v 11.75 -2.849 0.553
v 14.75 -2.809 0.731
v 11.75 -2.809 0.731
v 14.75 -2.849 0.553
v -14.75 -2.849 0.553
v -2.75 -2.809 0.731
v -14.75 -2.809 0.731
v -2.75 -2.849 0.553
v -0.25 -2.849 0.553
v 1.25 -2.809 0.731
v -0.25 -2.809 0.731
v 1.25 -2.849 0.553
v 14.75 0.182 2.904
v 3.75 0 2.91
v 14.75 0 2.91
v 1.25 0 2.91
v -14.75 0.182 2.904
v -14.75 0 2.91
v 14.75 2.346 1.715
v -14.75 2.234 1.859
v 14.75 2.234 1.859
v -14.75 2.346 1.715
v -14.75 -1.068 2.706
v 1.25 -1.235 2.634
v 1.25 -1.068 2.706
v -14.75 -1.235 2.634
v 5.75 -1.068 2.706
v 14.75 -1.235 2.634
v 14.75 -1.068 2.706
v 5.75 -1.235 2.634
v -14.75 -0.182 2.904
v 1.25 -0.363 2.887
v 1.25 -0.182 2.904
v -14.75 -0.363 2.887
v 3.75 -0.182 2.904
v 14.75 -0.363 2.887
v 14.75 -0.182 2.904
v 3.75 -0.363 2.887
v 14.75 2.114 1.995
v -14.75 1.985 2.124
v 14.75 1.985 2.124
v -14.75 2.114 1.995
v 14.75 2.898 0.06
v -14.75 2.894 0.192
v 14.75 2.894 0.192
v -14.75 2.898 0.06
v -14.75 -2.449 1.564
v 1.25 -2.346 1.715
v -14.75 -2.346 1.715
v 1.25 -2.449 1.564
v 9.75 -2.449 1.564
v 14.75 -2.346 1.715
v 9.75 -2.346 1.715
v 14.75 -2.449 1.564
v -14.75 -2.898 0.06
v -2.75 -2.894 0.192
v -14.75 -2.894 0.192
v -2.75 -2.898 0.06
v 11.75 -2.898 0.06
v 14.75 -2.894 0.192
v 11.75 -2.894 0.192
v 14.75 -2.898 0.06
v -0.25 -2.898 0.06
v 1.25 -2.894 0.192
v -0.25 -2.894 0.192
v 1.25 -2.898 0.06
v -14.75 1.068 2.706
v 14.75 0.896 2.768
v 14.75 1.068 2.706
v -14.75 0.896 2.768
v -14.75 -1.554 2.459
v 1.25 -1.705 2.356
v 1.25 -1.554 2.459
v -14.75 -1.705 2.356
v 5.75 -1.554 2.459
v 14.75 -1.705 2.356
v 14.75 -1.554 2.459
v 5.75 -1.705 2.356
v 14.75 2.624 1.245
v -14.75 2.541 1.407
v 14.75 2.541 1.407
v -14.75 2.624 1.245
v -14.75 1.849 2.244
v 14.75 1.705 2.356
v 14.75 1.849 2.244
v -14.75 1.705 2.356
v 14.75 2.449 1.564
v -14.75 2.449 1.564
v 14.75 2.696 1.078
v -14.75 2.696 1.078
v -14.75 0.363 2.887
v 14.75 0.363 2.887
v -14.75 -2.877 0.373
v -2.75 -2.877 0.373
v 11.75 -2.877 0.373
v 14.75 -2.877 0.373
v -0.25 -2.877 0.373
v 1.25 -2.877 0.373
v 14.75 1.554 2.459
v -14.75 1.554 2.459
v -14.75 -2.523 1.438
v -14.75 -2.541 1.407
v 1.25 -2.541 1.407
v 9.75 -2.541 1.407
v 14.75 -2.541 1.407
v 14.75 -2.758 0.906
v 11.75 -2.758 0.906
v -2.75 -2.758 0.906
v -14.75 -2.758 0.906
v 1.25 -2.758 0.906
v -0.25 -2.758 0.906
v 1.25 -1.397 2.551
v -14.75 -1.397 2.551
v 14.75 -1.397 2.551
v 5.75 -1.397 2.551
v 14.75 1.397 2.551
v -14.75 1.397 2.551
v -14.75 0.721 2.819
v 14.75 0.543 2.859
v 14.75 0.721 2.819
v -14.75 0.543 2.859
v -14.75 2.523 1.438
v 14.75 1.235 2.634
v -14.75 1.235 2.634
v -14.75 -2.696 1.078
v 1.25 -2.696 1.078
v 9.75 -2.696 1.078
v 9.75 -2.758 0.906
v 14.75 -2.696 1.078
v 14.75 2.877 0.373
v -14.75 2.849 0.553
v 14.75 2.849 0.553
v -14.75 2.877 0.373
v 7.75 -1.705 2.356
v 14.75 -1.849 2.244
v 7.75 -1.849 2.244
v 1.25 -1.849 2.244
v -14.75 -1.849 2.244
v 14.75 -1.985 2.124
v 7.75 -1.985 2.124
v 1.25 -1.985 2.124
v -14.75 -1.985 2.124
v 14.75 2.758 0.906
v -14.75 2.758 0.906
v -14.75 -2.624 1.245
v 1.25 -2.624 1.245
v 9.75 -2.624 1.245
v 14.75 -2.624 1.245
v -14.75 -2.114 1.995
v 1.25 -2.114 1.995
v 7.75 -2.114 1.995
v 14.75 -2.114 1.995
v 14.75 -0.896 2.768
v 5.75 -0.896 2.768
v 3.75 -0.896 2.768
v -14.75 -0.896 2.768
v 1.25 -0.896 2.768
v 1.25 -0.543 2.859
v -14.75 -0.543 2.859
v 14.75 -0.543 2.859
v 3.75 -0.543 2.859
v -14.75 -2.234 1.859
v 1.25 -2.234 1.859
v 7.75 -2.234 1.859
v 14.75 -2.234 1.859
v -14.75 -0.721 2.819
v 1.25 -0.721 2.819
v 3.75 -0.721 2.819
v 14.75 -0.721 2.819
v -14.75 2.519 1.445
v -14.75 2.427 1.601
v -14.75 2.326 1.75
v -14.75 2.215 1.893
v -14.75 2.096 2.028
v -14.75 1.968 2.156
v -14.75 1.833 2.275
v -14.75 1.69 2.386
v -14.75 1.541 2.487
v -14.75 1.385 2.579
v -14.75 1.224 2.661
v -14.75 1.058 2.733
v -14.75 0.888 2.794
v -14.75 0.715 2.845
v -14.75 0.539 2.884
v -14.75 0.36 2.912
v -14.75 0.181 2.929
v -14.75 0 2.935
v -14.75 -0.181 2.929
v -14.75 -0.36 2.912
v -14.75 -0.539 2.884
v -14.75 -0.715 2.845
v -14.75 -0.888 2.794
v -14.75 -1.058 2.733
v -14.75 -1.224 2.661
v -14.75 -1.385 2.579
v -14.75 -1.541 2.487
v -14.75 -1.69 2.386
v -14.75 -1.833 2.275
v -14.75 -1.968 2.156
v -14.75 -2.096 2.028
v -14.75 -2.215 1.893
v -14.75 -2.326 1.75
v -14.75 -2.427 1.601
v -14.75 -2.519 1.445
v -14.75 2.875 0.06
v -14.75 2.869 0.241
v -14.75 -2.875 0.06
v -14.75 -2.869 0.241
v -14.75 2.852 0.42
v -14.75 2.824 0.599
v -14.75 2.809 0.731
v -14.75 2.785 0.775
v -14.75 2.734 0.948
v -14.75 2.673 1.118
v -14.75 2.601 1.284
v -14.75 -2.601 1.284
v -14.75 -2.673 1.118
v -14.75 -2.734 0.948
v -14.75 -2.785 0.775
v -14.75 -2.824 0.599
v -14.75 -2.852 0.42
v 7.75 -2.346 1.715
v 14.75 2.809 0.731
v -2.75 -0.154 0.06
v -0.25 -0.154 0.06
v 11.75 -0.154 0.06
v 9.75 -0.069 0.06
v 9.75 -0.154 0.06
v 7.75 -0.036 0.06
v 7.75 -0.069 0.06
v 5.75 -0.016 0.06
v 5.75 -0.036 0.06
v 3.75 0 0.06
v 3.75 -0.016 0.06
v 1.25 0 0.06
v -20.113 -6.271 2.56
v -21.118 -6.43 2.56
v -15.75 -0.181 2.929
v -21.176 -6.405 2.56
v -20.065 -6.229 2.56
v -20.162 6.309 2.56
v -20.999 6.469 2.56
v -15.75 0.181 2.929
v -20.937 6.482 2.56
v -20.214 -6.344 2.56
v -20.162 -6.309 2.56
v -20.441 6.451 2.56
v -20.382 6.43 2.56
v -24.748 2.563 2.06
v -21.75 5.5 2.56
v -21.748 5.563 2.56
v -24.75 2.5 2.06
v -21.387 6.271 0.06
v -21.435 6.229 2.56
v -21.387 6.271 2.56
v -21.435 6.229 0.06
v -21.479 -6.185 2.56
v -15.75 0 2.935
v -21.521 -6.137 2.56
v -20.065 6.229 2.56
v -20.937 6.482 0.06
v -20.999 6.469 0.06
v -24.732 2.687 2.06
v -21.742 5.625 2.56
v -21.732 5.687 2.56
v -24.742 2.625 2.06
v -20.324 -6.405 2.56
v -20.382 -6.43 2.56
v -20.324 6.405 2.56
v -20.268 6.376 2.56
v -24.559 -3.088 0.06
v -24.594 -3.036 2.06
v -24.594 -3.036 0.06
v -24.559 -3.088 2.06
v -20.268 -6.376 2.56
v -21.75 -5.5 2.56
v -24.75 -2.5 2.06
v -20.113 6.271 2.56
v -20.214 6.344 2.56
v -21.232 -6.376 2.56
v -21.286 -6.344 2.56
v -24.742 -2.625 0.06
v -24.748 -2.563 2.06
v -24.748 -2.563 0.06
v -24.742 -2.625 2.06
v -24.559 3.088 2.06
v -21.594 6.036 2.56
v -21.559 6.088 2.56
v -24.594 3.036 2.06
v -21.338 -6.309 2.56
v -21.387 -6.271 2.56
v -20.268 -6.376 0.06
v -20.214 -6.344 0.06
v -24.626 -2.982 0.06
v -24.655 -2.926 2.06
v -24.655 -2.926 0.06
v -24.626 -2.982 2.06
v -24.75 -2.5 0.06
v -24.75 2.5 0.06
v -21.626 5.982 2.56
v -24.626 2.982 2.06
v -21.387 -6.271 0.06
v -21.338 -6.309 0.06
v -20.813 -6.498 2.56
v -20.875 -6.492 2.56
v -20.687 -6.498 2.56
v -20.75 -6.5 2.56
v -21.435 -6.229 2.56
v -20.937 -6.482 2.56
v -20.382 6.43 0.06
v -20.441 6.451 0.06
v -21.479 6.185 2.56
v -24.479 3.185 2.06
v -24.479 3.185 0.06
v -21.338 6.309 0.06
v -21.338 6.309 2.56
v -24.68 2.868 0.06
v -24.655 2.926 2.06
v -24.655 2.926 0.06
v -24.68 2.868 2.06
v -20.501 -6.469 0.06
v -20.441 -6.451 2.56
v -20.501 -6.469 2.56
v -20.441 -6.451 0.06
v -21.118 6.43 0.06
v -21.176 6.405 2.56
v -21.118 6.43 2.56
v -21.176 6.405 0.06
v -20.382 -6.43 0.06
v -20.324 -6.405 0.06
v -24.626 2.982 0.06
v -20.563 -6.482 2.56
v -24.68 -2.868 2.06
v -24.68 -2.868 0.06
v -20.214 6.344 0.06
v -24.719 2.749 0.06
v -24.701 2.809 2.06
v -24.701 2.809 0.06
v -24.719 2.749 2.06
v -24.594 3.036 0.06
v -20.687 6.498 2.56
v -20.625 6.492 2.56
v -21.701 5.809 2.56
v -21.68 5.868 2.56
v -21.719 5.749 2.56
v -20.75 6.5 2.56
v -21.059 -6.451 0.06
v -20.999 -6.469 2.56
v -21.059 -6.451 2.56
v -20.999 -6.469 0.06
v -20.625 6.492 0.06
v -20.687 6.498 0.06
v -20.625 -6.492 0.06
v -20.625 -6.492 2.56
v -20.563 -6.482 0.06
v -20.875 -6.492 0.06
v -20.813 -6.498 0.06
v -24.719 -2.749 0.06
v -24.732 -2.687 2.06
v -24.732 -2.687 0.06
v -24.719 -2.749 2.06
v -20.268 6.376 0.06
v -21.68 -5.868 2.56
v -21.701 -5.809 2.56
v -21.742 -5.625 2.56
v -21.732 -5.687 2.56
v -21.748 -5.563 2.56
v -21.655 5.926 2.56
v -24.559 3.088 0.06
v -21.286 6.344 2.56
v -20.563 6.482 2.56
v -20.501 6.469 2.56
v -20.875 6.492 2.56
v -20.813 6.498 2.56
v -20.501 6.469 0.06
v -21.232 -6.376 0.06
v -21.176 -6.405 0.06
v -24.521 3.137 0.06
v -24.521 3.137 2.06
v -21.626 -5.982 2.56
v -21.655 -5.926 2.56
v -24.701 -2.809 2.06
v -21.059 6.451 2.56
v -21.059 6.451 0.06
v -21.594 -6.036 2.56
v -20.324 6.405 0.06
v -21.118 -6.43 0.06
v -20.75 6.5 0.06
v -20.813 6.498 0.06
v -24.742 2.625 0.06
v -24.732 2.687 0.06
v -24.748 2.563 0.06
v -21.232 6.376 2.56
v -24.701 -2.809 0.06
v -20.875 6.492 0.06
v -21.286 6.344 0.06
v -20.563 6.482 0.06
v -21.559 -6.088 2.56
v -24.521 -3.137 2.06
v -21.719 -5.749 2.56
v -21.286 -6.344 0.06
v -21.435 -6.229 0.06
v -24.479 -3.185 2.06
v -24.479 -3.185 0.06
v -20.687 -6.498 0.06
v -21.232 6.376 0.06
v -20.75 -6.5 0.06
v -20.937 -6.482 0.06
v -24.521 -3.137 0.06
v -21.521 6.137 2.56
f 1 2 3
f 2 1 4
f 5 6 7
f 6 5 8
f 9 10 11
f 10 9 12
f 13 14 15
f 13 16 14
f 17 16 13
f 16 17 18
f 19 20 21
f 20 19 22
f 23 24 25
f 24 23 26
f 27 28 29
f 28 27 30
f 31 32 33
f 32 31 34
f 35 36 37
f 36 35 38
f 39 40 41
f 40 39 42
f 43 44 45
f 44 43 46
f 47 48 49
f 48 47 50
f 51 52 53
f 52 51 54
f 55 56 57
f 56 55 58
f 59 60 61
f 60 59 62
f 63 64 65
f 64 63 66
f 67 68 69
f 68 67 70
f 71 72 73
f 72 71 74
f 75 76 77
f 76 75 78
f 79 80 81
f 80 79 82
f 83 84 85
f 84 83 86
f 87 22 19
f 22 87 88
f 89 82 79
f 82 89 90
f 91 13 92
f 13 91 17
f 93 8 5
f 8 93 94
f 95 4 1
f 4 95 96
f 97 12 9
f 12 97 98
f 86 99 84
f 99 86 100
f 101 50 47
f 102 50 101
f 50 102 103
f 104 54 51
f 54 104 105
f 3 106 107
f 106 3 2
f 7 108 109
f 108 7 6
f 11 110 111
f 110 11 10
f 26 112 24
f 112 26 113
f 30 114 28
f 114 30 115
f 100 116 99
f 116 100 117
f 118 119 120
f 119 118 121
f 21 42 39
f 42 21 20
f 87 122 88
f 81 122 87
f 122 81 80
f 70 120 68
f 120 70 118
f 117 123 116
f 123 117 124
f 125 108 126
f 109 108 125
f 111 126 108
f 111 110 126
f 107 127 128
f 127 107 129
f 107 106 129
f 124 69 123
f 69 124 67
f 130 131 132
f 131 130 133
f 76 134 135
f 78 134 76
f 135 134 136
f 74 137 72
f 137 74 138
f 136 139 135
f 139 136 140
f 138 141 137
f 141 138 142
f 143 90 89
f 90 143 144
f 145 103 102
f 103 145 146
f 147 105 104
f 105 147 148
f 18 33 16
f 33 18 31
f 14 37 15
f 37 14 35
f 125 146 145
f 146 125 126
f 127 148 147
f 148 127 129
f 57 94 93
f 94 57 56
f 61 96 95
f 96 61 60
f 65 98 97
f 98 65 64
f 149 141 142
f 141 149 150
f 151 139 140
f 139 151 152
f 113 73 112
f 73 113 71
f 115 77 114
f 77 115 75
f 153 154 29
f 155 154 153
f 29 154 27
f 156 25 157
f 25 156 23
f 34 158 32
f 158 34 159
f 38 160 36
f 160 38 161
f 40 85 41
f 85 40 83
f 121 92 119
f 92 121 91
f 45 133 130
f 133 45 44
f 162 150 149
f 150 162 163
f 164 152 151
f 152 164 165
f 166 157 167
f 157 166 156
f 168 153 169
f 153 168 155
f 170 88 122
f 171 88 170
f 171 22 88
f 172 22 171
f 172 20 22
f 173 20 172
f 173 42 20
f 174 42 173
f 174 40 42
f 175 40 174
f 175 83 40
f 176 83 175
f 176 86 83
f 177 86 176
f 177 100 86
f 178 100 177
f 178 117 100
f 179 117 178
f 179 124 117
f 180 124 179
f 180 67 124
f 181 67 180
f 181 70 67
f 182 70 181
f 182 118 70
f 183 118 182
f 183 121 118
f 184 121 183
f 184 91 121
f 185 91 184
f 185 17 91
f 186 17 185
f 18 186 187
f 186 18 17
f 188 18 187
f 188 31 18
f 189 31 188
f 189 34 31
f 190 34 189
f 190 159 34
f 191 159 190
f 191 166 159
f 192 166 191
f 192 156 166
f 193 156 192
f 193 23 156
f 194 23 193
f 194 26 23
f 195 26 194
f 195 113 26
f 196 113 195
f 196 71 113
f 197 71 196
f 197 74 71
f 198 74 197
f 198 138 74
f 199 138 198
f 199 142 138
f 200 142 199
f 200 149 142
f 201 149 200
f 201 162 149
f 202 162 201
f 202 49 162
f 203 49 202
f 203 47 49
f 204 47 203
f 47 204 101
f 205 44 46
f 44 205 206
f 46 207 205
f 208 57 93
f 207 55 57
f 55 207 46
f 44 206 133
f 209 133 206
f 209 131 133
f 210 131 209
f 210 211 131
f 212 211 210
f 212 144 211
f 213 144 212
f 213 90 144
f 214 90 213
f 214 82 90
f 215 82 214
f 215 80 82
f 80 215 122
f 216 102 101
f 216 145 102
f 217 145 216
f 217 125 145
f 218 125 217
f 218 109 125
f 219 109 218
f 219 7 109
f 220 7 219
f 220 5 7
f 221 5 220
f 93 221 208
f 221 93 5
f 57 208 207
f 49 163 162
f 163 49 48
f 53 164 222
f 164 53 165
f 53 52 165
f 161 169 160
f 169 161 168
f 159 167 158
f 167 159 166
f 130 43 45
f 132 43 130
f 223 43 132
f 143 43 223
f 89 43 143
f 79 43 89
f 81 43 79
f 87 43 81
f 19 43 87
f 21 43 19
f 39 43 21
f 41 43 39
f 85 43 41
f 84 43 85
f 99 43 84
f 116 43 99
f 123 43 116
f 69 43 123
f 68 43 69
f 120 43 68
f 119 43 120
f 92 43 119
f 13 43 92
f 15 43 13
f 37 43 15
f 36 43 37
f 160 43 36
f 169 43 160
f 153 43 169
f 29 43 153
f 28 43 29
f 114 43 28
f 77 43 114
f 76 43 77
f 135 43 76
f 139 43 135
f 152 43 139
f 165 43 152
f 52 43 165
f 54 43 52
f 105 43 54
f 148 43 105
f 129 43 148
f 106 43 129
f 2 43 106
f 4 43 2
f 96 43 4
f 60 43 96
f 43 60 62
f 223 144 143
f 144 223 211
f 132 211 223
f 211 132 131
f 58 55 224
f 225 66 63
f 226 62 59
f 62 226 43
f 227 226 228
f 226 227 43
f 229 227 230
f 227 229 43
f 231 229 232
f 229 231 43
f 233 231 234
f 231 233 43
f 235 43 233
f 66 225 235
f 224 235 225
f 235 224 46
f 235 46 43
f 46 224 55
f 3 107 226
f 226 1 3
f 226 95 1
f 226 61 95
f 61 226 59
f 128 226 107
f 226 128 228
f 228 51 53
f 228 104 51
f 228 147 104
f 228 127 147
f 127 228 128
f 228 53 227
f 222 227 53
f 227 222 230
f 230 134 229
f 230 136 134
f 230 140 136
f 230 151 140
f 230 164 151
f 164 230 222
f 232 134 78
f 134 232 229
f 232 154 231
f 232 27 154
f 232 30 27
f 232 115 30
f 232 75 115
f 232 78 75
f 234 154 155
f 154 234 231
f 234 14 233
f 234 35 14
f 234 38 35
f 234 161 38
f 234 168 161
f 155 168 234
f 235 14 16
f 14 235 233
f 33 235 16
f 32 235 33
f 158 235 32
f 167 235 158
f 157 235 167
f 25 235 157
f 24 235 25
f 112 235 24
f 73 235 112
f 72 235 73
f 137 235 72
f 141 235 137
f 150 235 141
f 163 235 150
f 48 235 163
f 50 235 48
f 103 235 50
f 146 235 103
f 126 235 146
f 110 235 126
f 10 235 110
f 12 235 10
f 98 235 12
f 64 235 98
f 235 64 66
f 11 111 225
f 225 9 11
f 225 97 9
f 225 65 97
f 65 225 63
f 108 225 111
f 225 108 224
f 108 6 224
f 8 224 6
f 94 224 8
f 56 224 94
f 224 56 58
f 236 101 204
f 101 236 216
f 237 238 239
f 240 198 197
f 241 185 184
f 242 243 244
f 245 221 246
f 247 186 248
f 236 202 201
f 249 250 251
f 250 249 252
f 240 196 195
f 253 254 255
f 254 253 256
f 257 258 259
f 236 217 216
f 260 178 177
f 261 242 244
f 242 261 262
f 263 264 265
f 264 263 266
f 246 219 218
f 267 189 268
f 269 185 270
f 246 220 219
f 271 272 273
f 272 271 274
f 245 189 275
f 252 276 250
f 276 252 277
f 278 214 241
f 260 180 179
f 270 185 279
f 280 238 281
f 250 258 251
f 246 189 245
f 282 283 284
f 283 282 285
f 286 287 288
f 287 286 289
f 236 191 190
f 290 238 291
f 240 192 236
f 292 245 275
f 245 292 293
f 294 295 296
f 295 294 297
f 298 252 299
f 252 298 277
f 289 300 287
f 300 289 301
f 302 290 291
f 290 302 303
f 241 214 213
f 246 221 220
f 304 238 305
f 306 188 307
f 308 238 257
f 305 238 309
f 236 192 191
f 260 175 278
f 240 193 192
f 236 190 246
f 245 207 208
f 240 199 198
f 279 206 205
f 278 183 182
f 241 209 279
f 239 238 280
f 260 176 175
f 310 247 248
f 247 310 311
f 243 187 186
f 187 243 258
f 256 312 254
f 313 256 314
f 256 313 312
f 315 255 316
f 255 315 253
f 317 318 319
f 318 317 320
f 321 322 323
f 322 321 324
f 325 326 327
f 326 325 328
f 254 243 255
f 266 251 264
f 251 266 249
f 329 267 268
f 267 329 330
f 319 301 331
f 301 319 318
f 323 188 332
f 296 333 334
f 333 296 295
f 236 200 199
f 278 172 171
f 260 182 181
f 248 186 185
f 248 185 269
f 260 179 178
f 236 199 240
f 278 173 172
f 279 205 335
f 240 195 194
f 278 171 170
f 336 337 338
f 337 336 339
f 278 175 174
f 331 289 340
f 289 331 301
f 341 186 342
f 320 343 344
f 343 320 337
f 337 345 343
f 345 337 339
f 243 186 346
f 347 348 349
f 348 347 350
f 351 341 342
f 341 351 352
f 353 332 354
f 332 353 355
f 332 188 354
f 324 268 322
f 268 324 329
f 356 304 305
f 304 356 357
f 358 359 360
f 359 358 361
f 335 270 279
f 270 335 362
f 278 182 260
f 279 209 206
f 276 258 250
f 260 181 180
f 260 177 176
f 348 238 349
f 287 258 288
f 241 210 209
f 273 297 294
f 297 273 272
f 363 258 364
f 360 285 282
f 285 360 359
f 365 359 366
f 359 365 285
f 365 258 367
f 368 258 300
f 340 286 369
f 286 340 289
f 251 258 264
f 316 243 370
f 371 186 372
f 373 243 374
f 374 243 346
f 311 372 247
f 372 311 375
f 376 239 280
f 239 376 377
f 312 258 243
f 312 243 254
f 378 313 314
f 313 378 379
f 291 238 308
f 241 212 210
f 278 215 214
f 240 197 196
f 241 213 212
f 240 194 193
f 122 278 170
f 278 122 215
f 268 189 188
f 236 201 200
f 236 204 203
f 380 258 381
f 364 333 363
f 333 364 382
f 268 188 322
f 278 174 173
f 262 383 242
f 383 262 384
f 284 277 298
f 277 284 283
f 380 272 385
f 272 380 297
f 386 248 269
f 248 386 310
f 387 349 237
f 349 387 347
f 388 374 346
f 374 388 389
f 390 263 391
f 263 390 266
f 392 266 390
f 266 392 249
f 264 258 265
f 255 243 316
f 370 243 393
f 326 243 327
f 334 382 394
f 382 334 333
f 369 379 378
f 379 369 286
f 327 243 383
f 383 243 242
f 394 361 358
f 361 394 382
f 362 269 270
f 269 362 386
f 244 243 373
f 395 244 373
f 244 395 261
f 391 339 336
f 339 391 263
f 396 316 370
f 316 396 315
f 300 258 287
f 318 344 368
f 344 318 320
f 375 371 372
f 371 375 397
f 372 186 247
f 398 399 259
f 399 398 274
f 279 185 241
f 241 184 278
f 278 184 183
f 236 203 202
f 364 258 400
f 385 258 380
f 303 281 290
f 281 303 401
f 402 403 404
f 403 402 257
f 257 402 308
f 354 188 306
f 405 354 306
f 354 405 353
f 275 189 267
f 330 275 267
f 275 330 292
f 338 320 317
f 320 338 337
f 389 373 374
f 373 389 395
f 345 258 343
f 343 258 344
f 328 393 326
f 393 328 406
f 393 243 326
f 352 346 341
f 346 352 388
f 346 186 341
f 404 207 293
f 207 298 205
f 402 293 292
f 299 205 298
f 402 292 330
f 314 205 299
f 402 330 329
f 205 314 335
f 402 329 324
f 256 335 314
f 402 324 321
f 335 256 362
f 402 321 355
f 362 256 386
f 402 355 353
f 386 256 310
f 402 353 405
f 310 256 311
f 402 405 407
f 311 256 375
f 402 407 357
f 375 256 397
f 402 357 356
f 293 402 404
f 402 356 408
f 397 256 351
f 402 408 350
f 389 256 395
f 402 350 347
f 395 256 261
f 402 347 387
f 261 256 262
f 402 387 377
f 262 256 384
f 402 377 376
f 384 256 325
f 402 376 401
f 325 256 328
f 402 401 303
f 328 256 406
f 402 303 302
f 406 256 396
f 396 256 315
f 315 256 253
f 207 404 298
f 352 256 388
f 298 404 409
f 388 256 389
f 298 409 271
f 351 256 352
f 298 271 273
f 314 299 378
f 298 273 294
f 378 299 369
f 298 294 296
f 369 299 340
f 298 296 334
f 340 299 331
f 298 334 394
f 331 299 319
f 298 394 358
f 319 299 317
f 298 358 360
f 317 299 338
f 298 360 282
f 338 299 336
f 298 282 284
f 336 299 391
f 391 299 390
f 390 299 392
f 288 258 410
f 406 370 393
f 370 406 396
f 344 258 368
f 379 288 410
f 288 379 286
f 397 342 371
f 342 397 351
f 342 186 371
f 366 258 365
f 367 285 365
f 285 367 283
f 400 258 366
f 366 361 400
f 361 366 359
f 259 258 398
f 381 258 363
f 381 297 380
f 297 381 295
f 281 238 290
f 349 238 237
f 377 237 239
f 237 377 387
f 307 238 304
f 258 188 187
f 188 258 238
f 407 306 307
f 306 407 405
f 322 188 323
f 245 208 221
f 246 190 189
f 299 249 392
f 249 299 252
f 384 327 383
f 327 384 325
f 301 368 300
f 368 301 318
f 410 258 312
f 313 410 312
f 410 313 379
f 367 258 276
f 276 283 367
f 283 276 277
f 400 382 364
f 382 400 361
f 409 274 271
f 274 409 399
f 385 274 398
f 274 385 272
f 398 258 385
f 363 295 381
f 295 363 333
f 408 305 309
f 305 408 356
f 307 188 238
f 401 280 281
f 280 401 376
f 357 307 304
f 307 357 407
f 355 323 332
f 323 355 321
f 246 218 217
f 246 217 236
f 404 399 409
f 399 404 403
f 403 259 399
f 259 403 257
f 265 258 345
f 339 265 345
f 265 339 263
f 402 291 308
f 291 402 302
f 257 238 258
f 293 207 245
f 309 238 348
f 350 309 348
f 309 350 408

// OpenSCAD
// preview[view:north, tilt:bottom]

/* [Global] */

key = [1,2,3,4,5,0,1];

/* [Body] */

body_length = 29.5;
body_diameter = 2.9;

/* [Handle] */
handle = 1; // [1:Yes, 0:No]

/* [Cut] */
cut_spacing = 0.5;
cut_angle_step = 18;

/* [Quality] */

$fn = 100;

/* [Hidden] */

preview_tab = "";

module highlight(this_tab) {
  if (preview_tab == this_tab) {
    color("Chocolate") children();
  } else {
    color("NavajoWhite") children();
  }
}

module body(l = body_length, d = body_diameter) {
    difference() {
        rotate([0,90,0]) cylinder(l, d, d);
        translate([-0.25,-3,-0.05]) cube([body_length+0.5,6,6]);
    }
}

module cut(cuts, spacing = 0.5) {
    for(a = [0:len(cuts)-1]) {
        translate([3 + a*2,0,0])
        rotate([90+cuts[a]*cut_angle_step,0,0])
        translate([0,0,-0.01])
        difference() {
            cube([2 + spacing,3,3]);
//            translate([(2+spacing)/2,0,0]) cube([.5,3,3]); // support
        }
    }
}

module handle() {
    highlight("Handle") 
    hull() {
        translate([body_length,0,-0.06]) difference() {
            rotate([0,90,0]) cylinder(1,2.9-0.025,2.9-0.025);
            translate([-3,-3,0]) cube([6,6,6]);
        }
        translate([body_length+6,5.5,-2.56]) cylinder(2.5);
        translate([body_length+6,-5.5,-2.56]) cylinder(2.5);
        translate([body_length+9,2.5,-2.06]) cylinder(2);
        translate([body_length+9,-2.5,-2.06]) cylinder(2);
    }
}

module main() {
    translate([0,0,-0.01])
    difference() {
        highlight("Body") body();
        highlight("Cut") cut(key, cut_spacing);
    }
}

translate([29.5/2,0]) rotate([180,0,180]) {
    main();
    if(handle) handle();
}
